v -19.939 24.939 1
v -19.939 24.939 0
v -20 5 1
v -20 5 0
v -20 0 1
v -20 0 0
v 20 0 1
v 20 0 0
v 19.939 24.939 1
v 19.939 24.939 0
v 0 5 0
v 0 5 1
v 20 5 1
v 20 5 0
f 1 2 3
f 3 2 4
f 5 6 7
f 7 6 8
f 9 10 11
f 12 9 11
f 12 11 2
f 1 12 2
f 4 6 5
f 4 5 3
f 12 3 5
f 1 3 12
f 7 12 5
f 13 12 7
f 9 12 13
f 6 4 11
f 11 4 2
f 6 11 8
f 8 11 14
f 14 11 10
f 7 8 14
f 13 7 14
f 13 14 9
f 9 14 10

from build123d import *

# Parameters (mm, degrees)
F0_W     = 20
F0_H     = 5
F1_DEPTH = 1


with BuildPart() as f1:
    # F0 (on Top) → F1 (new body)
    with BuildSketch(Plane.XY):
        with Locations((-10, 2.5)):
            Rectangle(F0_W, F0_H)
        with Locations((10, 2.5)):
            Rectangle(F0_W, F0_H)
        Polygon((-20, 5), (0, 5), (-19.938792, 24.938792), align=None)
        Polygon((19.938792, 24.938792), (0, 5), (20, 5), align=None)
    extrude(amount=F1_DEPTH)


solid = f1.part
